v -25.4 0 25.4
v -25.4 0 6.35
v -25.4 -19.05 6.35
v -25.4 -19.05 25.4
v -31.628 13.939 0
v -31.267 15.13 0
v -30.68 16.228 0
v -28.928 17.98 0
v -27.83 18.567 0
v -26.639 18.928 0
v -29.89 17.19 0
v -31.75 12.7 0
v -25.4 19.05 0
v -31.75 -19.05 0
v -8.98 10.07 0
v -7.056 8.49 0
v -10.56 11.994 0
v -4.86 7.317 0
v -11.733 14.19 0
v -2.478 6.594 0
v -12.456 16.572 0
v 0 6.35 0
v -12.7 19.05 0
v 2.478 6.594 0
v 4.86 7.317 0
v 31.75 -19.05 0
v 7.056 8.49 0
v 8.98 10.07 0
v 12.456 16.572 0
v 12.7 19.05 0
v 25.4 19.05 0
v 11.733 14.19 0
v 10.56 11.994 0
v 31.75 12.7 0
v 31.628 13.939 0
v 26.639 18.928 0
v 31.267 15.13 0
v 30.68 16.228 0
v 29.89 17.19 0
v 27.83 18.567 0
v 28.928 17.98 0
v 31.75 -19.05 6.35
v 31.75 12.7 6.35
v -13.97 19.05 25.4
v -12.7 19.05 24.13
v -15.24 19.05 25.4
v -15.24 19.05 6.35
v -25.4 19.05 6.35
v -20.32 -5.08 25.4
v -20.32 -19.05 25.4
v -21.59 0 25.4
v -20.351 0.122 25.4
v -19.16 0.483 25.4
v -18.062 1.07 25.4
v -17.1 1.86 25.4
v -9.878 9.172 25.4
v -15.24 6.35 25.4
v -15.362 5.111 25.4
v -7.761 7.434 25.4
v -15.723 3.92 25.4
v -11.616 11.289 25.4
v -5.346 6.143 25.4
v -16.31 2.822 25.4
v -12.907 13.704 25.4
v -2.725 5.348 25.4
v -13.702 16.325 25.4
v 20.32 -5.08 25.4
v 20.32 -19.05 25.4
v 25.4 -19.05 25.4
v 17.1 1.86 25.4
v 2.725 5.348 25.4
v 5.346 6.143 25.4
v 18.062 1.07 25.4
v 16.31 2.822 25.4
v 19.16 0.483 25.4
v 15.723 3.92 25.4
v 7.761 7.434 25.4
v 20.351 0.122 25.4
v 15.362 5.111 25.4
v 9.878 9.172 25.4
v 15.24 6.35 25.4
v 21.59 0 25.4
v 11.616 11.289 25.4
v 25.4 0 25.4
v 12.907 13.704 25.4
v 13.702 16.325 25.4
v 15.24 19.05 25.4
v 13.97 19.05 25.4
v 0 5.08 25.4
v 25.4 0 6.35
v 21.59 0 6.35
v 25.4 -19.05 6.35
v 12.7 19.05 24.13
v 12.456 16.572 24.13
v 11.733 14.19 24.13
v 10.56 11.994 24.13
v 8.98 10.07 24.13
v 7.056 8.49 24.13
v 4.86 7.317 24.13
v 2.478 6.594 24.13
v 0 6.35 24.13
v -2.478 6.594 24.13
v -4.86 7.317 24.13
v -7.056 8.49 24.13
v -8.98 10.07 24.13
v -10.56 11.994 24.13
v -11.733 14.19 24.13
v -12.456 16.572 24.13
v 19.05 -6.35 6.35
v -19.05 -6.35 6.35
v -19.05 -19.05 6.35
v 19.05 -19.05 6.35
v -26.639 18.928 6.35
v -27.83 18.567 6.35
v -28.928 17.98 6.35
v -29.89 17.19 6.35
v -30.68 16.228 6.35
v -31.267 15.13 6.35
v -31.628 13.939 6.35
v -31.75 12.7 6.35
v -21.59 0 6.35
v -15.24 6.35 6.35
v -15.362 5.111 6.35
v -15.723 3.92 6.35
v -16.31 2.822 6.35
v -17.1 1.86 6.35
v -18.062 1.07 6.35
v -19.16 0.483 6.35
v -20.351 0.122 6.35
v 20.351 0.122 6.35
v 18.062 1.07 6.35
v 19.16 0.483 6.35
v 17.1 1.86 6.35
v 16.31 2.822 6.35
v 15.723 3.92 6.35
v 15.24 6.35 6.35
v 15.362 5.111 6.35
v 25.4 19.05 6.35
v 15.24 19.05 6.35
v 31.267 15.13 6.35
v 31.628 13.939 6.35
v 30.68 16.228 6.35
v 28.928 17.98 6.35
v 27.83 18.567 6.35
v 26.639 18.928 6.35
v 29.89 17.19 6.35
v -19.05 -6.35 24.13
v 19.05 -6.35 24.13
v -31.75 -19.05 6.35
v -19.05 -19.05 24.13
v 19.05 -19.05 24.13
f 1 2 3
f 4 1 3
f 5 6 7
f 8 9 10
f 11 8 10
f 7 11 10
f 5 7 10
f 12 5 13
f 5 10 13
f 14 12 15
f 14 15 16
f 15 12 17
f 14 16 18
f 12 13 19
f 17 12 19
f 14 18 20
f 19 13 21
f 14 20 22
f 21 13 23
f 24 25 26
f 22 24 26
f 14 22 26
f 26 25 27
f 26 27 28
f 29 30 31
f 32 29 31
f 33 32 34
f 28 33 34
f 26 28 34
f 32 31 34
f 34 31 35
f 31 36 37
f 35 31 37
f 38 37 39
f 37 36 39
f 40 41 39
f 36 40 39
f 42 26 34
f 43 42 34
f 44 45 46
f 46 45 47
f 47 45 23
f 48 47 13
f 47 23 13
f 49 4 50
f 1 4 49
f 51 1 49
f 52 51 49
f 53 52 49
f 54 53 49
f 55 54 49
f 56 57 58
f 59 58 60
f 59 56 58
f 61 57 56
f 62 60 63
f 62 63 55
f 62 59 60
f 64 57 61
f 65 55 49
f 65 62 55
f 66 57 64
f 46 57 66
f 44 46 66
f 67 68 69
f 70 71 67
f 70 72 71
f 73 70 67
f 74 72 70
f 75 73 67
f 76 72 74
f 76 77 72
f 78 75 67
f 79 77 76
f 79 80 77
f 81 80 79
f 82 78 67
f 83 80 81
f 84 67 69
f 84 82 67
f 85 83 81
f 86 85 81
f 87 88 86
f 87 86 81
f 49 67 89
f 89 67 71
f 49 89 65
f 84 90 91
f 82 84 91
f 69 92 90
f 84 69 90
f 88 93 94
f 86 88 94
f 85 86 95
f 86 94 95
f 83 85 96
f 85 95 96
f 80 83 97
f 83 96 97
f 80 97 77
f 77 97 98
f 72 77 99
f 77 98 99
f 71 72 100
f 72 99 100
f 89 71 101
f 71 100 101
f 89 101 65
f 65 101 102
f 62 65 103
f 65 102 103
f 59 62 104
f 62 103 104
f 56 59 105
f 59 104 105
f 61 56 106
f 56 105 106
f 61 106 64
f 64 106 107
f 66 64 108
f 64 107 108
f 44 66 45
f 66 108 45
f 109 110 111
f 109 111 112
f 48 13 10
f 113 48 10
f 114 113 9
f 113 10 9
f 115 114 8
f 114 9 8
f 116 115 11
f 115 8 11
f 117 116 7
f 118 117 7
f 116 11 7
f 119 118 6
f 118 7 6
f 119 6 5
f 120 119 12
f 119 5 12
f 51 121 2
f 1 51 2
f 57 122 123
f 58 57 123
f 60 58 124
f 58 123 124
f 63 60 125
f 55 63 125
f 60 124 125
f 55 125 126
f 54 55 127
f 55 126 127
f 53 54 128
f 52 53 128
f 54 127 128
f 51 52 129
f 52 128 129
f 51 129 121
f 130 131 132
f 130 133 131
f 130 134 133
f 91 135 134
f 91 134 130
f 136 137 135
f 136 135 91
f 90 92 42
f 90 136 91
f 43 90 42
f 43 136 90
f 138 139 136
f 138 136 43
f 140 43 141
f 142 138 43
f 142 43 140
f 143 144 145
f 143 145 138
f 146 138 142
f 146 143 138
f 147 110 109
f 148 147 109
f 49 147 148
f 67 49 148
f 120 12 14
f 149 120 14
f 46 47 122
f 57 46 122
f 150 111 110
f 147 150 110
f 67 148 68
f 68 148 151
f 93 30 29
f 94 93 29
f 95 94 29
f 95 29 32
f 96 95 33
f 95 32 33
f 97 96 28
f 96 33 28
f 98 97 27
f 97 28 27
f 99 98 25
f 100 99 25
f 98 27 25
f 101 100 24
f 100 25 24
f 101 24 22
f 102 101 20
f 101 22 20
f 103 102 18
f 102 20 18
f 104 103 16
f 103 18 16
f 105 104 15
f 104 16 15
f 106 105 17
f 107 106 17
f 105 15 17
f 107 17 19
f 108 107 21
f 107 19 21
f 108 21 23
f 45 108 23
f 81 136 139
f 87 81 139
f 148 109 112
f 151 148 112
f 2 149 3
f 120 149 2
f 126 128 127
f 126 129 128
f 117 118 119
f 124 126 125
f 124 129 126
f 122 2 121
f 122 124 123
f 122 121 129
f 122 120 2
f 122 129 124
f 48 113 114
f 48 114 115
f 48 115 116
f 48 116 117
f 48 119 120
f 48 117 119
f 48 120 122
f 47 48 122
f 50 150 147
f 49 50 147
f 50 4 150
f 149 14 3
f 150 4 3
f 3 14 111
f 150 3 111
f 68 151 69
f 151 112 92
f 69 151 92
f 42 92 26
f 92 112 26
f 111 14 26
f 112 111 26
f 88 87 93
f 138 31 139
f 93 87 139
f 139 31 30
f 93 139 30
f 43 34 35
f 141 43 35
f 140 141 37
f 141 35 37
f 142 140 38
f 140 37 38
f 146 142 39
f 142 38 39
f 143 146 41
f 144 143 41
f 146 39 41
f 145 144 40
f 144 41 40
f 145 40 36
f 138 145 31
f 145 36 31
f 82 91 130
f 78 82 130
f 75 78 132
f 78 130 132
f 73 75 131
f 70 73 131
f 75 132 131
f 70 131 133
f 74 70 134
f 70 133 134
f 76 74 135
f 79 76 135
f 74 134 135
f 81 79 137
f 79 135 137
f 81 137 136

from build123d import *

# Parameters (mm, degrees)
F1_DEPTH = 6.35
F3_DEPTH = 19.05
F4_SIZE  = 1.27


with BuildPart() as f1:
    # F0 (on Top) → F1 (new body)
    with BuildSketch(Plane.XY):
        with BuildLine():
            Line((-31.75, -19.05), (31.75, -19.05))
            Line((31.75, -19.05), (31.75, 12.7))
            ThreePointArc((31.75, 12.7), (29.8901280605, 17.1901280605), (25.4, 19.05))
            Line((25.4, 19.05), (12.7, 19.05))
            ThreePointArc((12.7, 19.05), (0, 6.35), (-12.7, 19.05))
            Line((-12.7, 19.05), (-25.4, 19.05))
            ThreePointArc((-25.4, 19.05), (-29.8901280605, 17.1901280605), (-31.75, 12.7))
            Line((-31.75, 12.7), (-31.75, -19.05))
        make_face()
    extrude(amount=F1_DEPTH)

    # F2 (on face) → F3 (join)
    with BuildSketch(Plane.XY.offset(6.35)):
        with BuildLine():
            Line((-25.4, 0), (-25.4, -19.05))
            Line((-25.4, -19.05), (-19.05, -19.05))
            Line((-19.05, -19.05), (-19.05, -6.35))
            Line((-19.05, -6.35), (19.05, -6.35))
            Line((19.05, -6.35), (19.05, -19.05))
            Line((19.05, -19.05), (25.4, -19.05))
            Line((25.4, -19.05), (25.4, 0))
            Line((25.4, 0), (21.59, 0))
            ThreePointArc((21.59, 0), (17.0998719395, 1.8598719395), (15.24, 6.35))
            Line((15.24, 6.35), (15.24, 19.05))
            Line((15.24, 19.05), (12.7, 19.05))
            ThreePointArc((12.7, 19.05), (0, 6.35), (-12.7, 19.05))
            Line((-12.7, 19.05), (-15.24, 19.05))
            Line((-15.24, 19.05), (-15.24, 6.35))
            ThreePointArc((-15.24, 6.35), (-17.0998719395, 1.8598719395), (-21.59, 0))
            Line((-21.59, 0), (-25.4, 0))
        make_face()
    extrude(amount=F3_DEPTH)

    # F4
    f4_edges = [f1.edges().sort_by_distance(p)[0] for p in [
        (0, 6.35, 25.4),
        (0, -6.35, 25.4),
        (-19.05, -12.7, 25.4),
        (19.05, -12.7, 25.4),
    ]]
    chamfer(f4_edges, length=F4_SIZE)


solid = f1.part
